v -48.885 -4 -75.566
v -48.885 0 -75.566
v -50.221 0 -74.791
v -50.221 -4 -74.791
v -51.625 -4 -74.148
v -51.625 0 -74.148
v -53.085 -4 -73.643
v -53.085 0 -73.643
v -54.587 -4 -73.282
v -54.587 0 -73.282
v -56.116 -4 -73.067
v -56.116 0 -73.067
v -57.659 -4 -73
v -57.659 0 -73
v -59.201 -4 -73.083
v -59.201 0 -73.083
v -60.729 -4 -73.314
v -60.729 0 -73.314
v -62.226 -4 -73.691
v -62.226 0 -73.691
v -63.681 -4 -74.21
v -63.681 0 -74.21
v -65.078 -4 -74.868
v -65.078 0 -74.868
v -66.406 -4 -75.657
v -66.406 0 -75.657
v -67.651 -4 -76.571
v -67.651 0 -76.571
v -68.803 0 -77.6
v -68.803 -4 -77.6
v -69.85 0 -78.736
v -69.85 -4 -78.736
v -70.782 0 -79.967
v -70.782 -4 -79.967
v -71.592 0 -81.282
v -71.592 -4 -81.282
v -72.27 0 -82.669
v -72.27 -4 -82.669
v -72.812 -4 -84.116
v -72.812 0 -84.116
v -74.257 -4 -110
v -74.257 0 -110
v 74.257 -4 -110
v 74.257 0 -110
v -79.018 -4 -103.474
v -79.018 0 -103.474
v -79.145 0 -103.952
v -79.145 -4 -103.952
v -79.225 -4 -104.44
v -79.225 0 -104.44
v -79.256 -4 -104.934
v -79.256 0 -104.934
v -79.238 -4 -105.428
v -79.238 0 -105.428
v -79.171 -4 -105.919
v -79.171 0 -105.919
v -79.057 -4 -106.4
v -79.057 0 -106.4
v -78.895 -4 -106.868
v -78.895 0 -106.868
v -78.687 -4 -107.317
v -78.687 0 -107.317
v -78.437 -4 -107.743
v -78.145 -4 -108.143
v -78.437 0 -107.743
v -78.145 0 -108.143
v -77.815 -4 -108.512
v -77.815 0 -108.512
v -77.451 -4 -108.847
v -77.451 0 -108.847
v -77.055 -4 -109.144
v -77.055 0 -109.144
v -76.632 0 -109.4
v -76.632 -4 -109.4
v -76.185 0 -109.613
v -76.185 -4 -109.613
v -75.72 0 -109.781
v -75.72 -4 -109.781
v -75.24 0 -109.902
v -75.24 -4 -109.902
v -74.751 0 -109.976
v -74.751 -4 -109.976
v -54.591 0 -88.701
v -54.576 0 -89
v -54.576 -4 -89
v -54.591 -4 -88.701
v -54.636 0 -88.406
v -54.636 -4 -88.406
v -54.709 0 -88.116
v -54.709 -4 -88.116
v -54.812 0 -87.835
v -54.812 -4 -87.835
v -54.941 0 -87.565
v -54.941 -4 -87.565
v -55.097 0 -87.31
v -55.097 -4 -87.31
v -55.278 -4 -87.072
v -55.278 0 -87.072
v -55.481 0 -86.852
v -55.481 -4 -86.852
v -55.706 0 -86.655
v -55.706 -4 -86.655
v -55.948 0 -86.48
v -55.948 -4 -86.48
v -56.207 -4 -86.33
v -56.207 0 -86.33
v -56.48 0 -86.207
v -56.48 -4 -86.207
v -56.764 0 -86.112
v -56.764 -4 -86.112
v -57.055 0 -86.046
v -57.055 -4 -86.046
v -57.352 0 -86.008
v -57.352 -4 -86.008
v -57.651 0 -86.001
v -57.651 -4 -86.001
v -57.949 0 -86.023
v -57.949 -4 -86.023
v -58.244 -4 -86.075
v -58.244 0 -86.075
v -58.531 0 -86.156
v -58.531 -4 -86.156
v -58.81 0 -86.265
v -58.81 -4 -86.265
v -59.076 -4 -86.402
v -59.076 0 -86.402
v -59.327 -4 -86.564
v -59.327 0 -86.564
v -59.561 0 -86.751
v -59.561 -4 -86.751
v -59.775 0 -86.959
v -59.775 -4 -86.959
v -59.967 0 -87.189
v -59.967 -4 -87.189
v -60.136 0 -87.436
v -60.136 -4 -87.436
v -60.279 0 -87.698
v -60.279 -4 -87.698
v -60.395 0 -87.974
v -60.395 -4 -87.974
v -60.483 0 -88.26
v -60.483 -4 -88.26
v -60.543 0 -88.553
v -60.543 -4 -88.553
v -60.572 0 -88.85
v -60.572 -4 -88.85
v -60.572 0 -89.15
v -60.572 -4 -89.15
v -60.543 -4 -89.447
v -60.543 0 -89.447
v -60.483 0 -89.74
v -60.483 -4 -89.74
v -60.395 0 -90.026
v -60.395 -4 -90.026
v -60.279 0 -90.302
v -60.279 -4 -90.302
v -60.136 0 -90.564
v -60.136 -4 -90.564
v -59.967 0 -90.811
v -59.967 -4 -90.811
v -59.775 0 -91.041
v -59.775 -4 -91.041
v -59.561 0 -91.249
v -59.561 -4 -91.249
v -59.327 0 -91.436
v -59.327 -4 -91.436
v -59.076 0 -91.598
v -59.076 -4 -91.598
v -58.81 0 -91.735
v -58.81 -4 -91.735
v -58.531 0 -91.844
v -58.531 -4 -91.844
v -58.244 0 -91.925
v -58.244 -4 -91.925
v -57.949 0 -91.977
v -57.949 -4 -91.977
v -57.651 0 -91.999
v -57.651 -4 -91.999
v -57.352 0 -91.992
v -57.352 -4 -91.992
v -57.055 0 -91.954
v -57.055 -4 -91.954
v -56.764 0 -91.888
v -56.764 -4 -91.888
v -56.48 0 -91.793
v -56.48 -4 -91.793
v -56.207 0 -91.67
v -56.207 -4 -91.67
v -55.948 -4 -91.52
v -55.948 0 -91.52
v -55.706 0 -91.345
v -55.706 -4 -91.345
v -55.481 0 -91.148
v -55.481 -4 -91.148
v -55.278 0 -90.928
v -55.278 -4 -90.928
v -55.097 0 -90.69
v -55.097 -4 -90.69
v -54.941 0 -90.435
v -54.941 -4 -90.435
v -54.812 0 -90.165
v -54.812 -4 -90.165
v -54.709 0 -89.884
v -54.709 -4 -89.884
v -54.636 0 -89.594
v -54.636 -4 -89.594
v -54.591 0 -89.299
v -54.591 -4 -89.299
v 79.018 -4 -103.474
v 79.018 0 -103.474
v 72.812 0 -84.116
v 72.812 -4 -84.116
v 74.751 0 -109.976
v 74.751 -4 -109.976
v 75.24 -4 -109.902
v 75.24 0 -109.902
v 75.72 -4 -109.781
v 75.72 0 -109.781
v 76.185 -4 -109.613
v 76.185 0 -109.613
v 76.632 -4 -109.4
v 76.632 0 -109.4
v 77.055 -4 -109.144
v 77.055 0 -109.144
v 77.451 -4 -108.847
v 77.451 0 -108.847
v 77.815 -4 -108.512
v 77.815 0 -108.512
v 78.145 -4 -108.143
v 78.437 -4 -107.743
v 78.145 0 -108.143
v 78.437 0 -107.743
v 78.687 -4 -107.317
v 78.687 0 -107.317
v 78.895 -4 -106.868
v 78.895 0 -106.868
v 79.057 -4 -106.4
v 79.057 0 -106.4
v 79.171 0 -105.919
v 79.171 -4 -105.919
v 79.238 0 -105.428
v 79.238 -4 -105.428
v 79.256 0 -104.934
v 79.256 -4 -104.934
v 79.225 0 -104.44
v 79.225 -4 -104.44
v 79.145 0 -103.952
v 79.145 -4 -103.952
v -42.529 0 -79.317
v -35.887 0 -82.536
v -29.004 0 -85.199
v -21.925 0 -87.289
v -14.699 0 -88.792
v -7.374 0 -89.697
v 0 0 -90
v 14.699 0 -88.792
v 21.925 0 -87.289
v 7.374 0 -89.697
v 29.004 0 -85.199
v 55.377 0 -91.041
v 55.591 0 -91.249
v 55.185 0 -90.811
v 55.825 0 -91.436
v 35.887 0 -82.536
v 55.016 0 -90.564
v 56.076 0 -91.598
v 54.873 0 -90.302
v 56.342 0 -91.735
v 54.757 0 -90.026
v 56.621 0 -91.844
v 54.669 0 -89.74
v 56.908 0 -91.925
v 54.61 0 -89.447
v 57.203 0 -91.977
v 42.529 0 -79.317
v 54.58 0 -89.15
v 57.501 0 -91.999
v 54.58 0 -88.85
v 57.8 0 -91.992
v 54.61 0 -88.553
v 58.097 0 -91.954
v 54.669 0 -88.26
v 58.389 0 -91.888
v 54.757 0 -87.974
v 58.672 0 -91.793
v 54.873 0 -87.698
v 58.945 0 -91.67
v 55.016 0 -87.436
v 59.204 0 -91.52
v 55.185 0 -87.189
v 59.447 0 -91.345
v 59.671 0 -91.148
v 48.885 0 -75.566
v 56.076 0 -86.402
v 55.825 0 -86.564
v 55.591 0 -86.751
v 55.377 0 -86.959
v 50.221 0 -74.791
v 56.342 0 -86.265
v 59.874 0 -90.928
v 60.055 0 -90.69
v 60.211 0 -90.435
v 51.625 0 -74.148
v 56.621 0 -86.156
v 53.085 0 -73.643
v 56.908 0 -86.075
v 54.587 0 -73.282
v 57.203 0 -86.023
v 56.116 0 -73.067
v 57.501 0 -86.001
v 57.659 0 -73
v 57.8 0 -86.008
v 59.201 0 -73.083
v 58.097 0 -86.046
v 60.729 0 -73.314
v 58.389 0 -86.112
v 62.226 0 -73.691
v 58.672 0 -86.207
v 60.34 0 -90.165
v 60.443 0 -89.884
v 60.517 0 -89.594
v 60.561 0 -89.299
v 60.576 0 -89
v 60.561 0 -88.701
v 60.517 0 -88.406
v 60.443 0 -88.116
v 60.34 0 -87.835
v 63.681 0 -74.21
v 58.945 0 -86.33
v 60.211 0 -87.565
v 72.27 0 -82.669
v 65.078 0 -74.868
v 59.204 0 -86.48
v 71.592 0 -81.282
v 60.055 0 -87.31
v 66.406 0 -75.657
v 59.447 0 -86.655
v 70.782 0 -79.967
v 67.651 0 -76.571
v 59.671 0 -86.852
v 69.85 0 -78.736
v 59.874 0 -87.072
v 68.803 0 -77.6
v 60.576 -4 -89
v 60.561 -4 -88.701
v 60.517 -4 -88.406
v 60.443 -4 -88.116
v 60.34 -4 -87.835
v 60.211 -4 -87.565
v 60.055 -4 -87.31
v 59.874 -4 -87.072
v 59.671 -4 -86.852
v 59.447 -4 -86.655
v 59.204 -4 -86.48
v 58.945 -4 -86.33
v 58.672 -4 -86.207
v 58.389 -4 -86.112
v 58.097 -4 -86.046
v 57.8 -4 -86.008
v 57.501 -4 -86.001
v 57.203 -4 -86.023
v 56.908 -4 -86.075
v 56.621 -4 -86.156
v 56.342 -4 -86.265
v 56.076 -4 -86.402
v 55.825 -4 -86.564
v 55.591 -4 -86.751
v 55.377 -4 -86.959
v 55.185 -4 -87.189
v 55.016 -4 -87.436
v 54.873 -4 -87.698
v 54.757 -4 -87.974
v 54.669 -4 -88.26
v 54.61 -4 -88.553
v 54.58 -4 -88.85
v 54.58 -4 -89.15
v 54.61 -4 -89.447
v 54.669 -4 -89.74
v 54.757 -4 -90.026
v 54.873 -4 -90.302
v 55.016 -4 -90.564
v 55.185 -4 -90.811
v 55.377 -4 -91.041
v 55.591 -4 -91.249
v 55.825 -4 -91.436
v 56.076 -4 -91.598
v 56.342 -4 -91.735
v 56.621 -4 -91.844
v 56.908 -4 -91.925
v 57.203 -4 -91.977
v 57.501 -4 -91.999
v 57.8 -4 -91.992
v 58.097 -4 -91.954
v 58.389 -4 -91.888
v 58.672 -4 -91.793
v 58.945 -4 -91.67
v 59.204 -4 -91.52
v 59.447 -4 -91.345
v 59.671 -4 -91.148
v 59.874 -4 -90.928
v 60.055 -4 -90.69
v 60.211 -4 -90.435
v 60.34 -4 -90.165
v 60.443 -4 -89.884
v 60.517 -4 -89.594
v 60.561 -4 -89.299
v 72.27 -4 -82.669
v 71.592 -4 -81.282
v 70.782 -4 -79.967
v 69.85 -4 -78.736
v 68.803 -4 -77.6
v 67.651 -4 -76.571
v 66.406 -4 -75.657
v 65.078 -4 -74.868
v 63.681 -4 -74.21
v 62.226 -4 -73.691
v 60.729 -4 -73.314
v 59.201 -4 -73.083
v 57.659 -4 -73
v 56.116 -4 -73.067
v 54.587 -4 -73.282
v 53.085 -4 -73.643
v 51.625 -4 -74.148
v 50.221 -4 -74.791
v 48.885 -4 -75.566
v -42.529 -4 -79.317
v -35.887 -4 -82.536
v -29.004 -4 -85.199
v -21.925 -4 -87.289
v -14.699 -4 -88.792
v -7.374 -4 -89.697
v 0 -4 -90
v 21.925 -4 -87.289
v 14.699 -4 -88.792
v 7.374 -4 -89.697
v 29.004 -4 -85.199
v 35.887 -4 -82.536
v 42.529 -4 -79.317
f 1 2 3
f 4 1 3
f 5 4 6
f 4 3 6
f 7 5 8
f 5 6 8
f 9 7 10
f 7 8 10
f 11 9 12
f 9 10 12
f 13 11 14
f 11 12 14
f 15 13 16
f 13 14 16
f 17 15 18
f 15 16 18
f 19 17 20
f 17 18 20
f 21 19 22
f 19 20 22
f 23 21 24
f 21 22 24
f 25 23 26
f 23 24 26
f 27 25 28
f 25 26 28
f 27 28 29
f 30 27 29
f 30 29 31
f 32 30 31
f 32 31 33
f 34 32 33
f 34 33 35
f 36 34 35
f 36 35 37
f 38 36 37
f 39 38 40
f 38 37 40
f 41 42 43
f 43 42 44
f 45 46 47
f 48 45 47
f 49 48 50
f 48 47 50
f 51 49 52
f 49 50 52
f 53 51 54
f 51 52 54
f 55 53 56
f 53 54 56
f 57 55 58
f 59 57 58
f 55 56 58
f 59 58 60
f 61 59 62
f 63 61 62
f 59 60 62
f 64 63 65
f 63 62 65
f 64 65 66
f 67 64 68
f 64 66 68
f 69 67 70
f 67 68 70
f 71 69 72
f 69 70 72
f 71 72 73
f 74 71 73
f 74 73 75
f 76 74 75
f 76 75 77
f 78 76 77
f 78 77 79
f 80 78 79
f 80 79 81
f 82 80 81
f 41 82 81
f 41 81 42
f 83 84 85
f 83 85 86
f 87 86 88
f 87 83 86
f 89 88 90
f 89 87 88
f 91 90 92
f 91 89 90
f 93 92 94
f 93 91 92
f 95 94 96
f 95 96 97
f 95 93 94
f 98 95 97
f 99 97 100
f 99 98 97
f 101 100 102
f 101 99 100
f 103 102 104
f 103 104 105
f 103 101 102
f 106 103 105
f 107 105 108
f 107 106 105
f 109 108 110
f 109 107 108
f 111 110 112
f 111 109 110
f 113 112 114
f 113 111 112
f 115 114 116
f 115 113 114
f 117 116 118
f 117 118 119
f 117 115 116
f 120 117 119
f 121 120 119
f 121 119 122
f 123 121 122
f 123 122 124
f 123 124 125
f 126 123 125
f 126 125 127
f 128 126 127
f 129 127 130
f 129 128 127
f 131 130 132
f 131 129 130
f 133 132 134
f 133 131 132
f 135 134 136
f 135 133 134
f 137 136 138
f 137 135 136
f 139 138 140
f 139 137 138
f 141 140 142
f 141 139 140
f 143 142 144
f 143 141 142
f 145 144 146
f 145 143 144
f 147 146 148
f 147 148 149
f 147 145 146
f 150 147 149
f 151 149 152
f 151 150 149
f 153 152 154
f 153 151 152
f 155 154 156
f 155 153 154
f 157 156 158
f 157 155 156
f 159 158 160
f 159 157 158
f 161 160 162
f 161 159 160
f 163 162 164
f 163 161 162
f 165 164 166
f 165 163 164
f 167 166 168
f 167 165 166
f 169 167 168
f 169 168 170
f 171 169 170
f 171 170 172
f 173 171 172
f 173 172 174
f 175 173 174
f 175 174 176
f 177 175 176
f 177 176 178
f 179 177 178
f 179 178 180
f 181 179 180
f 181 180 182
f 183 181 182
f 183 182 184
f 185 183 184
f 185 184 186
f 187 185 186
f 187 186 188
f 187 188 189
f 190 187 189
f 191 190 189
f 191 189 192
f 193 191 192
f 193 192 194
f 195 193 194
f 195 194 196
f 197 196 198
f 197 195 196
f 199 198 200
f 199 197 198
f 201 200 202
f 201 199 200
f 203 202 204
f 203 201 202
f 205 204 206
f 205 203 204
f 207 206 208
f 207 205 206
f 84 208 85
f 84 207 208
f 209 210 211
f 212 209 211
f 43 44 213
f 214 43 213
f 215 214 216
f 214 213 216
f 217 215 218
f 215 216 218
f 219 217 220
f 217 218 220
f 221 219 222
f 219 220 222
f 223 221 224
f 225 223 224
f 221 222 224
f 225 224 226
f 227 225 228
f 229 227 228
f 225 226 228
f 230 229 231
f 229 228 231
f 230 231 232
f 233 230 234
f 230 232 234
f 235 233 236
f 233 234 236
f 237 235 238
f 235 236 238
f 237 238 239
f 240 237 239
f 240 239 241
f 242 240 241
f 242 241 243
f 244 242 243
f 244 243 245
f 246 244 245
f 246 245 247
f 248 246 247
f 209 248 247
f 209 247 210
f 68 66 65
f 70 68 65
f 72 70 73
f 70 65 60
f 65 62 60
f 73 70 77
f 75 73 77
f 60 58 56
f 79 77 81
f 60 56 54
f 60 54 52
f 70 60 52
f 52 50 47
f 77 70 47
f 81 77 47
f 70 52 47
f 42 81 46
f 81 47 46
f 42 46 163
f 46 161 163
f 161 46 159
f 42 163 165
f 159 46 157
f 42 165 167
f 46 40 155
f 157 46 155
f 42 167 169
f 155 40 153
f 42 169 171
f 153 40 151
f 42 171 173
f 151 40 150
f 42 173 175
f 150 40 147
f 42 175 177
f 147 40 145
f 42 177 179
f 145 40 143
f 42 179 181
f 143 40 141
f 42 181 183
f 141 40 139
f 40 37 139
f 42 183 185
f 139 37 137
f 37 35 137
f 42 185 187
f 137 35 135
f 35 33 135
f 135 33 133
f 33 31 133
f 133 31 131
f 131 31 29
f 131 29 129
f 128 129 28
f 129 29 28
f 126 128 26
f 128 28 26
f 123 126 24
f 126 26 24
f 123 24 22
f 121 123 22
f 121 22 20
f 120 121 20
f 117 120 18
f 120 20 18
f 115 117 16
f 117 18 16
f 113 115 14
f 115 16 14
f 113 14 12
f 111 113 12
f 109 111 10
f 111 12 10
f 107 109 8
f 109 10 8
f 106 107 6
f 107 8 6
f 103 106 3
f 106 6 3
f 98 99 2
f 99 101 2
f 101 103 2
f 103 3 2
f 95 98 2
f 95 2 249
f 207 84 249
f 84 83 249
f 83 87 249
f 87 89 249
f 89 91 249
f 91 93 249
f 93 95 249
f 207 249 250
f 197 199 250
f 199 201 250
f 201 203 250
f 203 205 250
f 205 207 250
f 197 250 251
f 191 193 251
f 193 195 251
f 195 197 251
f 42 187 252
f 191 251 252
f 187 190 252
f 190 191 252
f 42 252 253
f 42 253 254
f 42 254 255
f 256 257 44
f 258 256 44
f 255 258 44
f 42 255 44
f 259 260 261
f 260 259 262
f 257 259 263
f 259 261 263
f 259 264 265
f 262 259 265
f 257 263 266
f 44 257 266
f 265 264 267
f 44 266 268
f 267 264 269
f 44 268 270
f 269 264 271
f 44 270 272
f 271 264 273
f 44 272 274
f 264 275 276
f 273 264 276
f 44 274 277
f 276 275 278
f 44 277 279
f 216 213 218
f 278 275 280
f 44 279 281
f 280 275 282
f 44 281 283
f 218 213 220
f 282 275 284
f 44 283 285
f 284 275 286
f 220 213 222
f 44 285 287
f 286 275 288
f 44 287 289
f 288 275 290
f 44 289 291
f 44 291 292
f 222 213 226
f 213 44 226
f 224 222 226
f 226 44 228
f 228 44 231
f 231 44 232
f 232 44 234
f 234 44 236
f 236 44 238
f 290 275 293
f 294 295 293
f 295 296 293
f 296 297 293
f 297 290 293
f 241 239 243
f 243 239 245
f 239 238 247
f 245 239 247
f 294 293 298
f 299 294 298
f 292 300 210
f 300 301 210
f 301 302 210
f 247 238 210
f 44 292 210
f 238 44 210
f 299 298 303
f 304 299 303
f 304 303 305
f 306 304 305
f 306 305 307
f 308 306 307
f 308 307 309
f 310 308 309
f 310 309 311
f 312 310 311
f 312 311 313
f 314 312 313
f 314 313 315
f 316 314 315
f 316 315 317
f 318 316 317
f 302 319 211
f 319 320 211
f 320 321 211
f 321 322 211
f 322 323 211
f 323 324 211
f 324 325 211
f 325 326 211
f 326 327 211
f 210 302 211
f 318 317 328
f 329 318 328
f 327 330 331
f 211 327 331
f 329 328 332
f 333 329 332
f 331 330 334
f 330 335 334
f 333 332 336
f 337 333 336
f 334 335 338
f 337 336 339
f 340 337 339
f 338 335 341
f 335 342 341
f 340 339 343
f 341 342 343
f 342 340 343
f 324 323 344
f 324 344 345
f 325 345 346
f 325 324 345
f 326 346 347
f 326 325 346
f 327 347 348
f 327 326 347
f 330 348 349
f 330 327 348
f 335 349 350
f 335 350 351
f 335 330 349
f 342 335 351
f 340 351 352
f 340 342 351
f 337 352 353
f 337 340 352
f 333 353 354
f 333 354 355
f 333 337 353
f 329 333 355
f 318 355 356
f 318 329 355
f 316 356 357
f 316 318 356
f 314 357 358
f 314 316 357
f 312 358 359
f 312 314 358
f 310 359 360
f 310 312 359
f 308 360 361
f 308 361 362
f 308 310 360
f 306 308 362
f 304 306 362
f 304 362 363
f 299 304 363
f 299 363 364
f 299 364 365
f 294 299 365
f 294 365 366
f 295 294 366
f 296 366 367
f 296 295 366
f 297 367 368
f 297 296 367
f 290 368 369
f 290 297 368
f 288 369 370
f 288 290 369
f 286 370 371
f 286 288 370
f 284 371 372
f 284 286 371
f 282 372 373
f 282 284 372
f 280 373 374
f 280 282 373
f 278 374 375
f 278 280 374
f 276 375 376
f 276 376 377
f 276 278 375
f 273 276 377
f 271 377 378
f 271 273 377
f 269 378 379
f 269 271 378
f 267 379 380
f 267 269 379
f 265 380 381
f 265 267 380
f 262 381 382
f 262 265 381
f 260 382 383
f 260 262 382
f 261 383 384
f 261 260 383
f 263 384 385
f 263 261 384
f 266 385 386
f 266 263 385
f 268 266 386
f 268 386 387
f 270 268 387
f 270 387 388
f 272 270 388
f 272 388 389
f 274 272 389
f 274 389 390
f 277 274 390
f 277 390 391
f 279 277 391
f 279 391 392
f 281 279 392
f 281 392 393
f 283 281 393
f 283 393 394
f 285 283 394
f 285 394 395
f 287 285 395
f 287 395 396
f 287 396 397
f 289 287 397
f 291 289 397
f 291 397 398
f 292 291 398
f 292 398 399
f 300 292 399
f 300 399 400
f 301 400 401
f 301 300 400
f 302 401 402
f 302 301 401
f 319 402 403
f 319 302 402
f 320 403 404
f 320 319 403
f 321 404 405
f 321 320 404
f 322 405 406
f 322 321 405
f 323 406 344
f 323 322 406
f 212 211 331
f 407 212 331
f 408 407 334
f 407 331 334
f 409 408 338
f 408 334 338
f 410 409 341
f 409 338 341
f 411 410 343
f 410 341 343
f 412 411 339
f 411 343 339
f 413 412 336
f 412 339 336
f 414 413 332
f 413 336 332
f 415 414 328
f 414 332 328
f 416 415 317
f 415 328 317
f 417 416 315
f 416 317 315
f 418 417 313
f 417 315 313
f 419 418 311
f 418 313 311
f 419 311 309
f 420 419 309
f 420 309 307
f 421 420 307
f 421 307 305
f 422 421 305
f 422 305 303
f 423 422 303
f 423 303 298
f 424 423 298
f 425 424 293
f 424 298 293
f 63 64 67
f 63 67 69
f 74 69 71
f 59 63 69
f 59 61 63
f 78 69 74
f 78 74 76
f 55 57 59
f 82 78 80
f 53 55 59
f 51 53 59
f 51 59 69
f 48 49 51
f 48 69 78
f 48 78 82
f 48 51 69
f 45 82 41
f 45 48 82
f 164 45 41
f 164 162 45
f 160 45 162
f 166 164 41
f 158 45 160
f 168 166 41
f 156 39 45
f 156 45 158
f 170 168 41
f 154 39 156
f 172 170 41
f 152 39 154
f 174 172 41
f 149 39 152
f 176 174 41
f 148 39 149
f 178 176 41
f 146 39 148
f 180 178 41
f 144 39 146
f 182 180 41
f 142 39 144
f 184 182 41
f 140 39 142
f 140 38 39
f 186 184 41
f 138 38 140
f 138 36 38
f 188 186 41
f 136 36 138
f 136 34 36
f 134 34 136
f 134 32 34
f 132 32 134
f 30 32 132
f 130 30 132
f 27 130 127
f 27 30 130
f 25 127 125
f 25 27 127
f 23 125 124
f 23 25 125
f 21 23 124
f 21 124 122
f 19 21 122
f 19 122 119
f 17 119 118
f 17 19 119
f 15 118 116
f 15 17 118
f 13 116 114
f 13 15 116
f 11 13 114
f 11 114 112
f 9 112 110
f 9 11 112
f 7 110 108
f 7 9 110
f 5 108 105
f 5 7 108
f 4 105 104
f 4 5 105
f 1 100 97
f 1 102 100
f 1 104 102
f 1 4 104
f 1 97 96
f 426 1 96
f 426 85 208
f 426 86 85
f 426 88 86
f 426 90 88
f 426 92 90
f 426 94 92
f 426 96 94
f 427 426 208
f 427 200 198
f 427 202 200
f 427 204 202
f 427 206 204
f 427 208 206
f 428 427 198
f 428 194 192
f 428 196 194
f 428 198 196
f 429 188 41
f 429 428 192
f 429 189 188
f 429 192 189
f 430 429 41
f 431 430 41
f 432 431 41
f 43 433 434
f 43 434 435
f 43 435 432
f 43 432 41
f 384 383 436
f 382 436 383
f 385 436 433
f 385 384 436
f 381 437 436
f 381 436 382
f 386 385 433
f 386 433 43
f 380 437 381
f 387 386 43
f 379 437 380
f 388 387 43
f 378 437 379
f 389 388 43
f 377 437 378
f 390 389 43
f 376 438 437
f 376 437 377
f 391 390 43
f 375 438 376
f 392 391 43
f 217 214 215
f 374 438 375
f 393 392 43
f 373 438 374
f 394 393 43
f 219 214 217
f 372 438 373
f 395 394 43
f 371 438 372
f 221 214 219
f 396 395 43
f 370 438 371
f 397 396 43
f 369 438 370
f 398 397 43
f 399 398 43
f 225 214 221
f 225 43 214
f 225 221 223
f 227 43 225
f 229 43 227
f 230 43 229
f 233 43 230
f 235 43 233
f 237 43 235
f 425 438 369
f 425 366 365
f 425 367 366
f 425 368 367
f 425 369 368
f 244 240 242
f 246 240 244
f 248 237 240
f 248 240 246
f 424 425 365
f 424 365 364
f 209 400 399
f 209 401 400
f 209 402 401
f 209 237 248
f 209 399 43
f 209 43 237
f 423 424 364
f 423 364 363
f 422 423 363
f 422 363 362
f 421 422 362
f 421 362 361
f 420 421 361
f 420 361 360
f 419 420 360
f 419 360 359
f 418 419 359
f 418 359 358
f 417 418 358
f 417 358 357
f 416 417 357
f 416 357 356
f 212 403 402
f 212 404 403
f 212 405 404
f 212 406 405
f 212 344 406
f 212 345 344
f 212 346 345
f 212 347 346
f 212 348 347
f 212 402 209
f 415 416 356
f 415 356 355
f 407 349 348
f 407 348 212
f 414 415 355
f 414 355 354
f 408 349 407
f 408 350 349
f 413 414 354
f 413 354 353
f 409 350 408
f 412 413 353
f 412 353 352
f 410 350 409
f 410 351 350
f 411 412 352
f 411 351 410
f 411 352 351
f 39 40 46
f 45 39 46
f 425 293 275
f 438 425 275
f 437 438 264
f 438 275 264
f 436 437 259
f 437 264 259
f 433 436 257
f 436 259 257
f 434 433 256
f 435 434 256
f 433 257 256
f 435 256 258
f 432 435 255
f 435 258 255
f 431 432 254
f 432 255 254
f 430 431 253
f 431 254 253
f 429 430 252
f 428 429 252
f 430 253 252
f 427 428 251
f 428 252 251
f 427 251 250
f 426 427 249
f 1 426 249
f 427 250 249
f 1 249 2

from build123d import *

# Parameters (mm, degrees)
F0_R     = 3
F1_DEPTH = 4


with BuildPart() as f1:
    # F0 (on Front) → F1 (new body)
    with BuildSketch(Plane.XZ):
        with BuildLine():
            ThreePointArc((48.885314, -75.566038), (0, -90), (-48.885314, -75.566038))
            ThreePointArc((-48.885314, -75.566038), (-62.959815, -73.932985), (-72.812289, -84.115676))
            Line((-72.812289, -84.115676), (-79.017923, -103.473649))
            ThreePointArc((-79.017923, -103.473649), (-78.295886, -107.946883), (-74.256595, -110))
            Line((-74.256595, -110), (32.693748, -110))
            Line((32.693748, -110), (61.95706, -110))
            Line((61.95706, -110), (74.256595, -110))
            ThreePointArc((74.256595, -110), (78.295886, -107.946883), (79.017923, -103.473649))
            Line((79.017923, -103.473649), (72.812289, -84.115676))
            ThreePointArc((72.812289, -84.115676), (62.959815, -73.932985), (48.885314, -75.566038))
        make_face()
        with Locations((-57.576037, -89)):
            Circle(F0_R, mode=Mode.SUBTRACT)
        with Locations((57.576037, -89)):
            Circle(F0_R, mode=Mode.SUBTRACT)
    extrude(amount=F1_DEPTH)


solid = f1.part
